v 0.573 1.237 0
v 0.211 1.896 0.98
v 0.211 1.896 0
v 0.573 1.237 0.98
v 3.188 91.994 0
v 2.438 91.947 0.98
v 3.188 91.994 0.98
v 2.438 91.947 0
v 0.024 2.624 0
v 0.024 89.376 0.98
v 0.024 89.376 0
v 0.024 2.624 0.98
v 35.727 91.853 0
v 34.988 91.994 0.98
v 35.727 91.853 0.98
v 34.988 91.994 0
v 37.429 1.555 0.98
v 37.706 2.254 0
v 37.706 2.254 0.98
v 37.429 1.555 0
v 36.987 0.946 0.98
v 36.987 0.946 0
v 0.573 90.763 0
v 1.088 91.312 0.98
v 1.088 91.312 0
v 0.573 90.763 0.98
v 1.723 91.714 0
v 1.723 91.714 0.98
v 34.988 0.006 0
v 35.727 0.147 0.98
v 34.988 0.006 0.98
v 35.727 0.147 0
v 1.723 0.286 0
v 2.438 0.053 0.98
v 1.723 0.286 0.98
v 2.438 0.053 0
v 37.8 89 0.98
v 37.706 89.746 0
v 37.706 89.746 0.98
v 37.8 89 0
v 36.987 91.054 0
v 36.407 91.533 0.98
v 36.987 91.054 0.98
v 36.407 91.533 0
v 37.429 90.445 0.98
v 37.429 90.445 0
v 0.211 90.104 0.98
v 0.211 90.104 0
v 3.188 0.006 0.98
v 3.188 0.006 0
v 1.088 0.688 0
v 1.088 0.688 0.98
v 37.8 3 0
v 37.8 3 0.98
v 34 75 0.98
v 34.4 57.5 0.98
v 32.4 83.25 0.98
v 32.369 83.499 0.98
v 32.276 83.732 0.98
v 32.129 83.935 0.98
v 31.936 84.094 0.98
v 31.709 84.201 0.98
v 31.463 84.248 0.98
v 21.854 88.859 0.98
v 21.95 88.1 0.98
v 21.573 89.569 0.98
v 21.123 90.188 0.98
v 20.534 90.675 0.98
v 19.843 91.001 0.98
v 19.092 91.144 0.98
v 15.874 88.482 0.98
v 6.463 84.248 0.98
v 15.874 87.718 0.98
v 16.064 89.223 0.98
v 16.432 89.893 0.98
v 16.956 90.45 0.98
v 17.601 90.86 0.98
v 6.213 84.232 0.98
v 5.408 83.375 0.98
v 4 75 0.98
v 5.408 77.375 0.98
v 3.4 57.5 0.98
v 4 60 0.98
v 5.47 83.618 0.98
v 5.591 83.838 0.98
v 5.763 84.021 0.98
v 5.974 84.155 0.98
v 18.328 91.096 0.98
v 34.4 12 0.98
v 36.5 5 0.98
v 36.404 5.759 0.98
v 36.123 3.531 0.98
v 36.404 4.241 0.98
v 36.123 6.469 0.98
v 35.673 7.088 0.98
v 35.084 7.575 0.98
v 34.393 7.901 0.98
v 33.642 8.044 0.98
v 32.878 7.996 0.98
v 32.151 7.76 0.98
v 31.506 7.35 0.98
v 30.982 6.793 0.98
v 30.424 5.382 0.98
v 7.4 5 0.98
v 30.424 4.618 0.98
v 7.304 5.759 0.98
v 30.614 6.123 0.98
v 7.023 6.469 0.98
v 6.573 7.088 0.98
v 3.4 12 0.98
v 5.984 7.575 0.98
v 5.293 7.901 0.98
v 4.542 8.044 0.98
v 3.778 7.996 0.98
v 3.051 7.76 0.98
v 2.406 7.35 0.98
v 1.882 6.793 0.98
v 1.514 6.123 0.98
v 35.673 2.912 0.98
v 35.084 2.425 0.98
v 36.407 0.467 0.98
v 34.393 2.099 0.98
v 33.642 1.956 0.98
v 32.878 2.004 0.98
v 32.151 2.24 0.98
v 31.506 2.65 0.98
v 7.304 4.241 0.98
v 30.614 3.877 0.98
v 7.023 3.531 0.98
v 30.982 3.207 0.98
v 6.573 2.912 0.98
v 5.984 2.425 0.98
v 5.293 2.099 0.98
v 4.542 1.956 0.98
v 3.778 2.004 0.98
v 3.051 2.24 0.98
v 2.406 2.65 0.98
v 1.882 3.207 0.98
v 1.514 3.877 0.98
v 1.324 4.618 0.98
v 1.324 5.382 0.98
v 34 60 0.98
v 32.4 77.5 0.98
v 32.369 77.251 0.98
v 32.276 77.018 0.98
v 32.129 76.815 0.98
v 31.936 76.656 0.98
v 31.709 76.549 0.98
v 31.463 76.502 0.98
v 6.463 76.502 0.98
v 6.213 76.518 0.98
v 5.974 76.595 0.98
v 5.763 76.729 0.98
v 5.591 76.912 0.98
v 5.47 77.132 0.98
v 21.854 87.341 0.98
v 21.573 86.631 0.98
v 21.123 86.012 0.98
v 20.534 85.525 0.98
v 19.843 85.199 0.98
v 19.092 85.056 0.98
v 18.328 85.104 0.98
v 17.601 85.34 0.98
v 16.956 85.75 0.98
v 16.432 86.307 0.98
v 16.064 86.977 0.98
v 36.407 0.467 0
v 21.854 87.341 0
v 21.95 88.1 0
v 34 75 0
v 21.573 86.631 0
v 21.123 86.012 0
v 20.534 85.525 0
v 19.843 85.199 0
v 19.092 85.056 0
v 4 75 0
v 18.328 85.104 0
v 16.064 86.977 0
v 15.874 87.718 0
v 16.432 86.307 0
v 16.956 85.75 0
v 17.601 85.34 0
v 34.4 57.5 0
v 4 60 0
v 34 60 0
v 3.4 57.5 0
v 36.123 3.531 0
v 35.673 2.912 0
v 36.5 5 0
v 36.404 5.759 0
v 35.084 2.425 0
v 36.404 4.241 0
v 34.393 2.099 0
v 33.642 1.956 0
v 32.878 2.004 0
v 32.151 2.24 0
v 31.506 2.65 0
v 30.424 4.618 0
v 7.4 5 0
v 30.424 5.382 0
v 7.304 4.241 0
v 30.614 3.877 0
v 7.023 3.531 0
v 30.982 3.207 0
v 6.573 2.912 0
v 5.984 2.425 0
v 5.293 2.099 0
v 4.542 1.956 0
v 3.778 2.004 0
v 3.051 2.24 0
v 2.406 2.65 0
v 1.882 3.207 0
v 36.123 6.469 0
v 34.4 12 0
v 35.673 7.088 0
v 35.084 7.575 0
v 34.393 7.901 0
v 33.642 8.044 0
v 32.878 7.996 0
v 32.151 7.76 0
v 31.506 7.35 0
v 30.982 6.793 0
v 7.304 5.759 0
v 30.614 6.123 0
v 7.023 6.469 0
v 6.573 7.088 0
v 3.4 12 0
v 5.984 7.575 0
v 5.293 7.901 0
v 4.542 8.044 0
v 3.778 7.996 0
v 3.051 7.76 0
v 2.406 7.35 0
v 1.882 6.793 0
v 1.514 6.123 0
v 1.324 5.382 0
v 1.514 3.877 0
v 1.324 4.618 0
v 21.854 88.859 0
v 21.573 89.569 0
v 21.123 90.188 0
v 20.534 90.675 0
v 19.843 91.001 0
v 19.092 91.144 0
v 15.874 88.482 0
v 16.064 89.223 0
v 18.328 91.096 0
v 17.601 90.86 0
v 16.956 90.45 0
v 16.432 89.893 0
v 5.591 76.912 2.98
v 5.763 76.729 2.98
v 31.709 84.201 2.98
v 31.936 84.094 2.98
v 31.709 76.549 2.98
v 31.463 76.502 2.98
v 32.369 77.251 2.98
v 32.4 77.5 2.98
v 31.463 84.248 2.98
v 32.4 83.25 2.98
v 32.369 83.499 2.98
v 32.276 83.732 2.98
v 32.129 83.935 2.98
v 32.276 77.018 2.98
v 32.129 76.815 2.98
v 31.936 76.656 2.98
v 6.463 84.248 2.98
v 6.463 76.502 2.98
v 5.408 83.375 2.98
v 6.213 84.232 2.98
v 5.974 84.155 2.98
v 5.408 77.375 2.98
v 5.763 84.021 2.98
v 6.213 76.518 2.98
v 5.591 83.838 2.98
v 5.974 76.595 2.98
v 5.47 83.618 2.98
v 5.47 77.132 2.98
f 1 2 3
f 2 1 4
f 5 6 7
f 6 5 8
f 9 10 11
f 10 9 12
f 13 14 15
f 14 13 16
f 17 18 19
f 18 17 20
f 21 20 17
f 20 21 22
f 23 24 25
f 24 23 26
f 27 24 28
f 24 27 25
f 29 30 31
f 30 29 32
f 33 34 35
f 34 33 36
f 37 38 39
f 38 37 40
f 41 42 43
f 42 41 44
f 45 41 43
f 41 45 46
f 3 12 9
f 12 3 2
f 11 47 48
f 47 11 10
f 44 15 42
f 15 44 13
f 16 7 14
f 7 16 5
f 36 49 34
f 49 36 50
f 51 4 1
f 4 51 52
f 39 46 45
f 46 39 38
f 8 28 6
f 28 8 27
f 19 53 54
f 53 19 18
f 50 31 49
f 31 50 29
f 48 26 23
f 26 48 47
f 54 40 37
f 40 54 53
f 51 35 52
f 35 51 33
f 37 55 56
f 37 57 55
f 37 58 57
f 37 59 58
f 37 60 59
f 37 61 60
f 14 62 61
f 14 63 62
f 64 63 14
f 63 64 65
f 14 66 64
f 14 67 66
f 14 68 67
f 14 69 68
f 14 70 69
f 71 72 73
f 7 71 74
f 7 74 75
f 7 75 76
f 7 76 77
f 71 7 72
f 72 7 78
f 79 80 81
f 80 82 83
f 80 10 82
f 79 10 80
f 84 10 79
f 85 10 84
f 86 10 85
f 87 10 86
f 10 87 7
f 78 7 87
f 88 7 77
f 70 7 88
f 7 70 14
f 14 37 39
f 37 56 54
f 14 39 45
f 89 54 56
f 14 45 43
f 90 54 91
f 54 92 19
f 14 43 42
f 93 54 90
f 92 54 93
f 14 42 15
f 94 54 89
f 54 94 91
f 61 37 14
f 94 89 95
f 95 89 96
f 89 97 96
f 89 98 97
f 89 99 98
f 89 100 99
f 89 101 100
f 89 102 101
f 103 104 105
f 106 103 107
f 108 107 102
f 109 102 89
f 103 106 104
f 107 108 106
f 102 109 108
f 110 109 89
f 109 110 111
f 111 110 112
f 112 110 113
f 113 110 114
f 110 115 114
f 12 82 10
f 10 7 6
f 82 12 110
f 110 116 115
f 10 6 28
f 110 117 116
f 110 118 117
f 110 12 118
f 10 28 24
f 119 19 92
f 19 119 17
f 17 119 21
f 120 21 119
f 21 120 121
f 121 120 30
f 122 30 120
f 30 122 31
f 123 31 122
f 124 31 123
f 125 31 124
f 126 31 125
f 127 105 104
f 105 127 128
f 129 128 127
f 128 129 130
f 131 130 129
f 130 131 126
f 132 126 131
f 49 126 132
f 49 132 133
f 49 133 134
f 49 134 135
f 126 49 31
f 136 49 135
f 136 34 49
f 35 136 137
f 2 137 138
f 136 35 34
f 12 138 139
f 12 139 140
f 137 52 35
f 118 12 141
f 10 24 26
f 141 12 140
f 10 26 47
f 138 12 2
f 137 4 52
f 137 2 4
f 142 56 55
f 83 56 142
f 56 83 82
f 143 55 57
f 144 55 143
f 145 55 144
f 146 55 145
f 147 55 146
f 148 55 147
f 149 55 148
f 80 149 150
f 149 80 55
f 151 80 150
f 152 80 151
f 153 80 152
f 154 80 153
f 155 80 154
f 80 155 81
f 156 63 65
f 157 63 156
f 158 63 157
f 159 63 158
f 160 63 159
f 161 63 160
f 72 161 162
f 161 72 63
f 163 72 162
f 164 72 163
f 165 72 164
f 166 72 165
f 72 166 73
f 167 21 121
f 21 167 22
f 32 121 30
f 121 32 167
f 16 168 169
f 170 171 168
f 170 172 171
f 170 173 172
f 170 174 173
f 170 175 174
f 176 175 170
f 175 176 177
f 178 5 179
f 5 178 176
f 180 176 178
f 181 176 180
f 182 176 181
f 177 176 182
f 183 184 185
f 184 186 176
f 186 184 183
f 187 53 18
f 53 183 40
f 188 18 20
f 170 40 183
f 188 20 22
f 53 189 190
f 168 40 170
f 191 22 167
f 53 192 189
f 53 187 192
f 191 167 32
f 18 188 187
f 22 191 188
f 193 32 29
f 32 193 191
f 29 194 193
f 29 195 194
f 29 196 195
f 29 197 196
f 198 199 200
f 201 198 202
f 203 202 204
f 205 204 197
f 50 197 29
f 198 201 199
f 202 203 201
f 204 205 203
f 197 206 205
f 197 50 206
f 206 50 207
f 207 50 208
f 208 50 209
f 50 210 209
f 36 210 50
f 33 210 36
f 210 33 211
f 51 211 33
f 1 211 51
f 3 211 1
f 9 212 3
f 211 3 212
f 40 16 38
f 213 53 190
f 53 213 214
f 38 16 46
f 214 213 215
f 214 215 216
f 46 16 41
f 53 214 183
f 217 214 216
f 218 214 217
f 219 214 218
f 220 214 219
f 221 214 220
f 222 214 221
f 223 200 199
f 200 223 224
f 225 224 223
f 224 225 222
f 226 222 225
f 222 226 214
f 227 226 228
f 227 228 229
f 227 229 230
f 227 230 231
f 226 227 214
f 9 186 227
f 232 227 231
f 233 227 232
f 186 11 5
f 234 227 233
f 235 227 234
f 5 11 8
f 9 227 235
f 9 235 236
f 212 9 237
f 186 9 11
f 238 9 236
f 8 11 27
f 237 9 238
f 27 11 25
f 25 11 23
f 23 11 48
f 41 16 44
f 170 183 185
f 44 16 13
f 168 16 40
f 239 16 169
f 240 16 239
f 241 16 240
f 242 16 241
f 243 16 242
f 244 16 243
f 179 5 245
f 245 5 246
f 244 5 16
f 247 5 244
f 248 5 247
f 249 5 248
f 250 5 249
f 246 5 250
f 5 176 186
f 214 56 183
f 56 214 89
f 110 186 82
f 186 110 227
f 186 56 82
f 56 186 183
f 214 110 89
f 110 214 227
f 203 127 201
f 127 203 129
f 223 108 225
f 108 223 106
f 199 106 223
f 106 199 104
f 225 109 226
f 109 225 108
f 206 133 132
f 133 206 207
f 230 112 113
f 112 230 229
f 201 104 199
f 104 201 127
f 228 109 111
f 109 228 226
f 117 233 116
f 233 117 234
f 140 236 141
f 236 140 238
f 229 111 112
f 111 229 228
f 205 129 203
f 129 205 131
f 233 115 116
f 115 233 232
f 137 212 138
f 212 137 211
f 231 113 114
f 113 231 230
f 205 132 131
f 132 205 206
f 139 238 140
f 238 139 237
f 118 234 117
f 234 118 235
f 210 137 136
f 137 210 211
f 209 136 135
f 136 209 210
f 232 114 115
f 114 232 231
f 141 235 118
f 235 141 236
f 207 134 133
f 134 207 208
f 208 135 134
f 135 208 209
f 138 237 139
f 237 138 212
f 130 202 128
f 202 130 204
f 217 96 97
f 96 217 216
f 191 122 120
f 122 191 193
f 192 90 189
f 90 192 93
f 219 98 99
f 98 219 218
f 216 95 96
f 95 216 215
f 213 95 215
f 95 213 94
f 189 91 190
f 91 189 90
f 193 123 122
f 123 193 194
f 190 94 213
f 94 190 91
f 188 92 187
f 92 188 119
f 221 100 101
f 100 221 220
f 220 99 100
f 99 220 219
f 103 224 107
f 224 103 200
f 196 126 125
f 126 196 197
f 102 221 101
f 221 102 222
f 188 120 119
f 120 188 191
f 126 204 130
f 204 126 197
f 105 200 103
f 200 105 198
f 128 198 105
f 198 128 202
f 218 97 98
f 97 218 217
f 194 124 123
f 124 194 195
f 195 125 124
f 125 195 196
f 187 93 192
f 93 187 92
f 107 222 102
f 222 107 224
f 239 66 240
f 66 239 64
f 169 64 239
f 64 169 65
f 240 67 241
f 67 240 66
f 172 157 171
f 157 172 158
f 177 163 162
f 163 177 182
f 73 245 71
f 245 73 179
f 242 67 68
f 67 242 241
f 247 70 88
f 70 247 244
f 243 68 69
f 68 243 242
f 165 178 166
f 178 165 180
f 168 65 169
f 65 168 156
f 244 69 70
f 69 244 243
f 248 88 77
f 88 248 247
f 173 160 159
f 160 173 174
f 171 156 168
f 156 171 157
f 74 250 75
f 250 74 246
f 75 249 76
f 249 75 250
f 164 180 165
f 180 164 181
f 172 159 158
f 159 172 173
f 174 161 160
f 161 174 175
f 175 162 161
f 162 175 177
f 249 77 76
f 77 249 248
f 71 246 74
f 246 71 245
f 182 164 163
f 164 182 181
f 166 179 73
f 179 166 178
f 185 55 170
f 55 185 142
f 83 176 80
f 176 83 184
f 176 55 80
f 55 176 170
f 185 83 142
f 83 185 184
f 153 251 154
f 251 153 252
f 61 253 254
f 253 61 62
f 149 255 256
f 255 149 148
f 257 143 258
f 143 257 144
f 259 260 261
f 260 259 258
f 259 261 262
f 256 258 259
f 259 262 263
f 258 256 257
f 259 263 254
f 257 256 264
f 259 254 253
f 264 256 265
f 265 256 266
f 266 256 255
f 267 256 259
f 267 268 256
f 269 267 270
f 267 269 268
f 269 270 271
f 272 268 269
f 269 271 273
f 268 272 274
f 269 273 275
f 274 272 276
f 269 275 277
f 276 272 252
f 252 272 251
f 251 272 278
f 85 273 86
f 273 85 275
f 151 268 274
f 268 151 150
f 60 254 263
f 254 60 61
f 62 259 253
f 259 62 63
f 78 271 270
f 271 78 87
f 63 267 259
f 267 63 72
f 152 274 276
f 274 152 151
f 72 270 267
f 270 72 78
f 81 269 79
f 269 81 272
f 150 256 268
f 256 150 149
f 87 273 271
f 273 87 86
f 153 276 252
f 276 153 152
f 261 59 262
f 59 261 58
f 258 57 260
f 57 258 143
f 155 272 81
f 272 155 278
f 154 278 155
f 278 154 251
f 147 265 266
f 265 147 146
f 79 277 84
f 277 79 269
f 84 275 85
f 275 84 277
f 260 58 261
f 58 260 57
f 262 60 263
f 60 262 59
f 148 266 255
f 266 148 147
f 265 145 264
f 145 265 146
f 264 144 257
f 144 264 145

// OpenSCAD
$fn = 25;

cornerRadius = 3;

module roundedSquare(size=[10,10], radius=1) {
    hull() {
        for (x = [radius, size[0] - radius])
            for (y = [radius, size[1] - radius])
                translate([x, y]) circle(r = radius);
    }
}

module roundedPlate(width, height, thickness, radius) {
    linear_extrude(thickness)
        roundedSquare([width, height], radius);
}

// 37.8mm Width x 92mm Height x 3mm Thickness

bracketWidth = 37.8;
bracketHeight = 92;
bracketThickness = 0.98;
bracketHoleDiameter = 6.1;
m3HoleDiameter = 3.3;
buttonHoleDiameter = 3.85;
oledWidth = 31;
oledHeight = 45.5;

lockingHoleWidth = 2;
lockingHoleHeight = 3;

difference() {
    roundedPlate(bracketWidth, bracketHeight, bracketThickness, cornerRadius);

    // Subtract LCD Hole
    translate([(bracketWidth - oledWidth)/2, 12, -1]) {
        cube([oledWidth, oledHeight, bracketThickness+2]);
    }

    //Subtract Screw holes (top)
    translate([4.35, 5, -1]) {
        cylinder(h = bracketThickness+2, d = bracketHoleDiameter);
    }
    translate([bracketWidth - 4.35, 5, -1]) {
        cylinder(h = bracketThickness+2, d = bracketHoleDiameter);
    }

    //Subtract Screw holes (bottom)
    translate([bracketWidth/2, 82+bracketHoleDiameter, -1]) {
        cylinder(h = bracketThickness+2, d = bracketHoleDiameter);
    }

    //Subtract button area
    translate([4, 60, -1]) {
        cube([30, 15, 3]);
    }
}

irWidth = 27;
irHeight = 7.75;
irDepth = 2.5;

translate([(bracketWidth - irWidth)/2, 76.5, bracketThickness-0.5]) {
    roundedPlate(irWidth, irHeight, irDepth, 1);
}
